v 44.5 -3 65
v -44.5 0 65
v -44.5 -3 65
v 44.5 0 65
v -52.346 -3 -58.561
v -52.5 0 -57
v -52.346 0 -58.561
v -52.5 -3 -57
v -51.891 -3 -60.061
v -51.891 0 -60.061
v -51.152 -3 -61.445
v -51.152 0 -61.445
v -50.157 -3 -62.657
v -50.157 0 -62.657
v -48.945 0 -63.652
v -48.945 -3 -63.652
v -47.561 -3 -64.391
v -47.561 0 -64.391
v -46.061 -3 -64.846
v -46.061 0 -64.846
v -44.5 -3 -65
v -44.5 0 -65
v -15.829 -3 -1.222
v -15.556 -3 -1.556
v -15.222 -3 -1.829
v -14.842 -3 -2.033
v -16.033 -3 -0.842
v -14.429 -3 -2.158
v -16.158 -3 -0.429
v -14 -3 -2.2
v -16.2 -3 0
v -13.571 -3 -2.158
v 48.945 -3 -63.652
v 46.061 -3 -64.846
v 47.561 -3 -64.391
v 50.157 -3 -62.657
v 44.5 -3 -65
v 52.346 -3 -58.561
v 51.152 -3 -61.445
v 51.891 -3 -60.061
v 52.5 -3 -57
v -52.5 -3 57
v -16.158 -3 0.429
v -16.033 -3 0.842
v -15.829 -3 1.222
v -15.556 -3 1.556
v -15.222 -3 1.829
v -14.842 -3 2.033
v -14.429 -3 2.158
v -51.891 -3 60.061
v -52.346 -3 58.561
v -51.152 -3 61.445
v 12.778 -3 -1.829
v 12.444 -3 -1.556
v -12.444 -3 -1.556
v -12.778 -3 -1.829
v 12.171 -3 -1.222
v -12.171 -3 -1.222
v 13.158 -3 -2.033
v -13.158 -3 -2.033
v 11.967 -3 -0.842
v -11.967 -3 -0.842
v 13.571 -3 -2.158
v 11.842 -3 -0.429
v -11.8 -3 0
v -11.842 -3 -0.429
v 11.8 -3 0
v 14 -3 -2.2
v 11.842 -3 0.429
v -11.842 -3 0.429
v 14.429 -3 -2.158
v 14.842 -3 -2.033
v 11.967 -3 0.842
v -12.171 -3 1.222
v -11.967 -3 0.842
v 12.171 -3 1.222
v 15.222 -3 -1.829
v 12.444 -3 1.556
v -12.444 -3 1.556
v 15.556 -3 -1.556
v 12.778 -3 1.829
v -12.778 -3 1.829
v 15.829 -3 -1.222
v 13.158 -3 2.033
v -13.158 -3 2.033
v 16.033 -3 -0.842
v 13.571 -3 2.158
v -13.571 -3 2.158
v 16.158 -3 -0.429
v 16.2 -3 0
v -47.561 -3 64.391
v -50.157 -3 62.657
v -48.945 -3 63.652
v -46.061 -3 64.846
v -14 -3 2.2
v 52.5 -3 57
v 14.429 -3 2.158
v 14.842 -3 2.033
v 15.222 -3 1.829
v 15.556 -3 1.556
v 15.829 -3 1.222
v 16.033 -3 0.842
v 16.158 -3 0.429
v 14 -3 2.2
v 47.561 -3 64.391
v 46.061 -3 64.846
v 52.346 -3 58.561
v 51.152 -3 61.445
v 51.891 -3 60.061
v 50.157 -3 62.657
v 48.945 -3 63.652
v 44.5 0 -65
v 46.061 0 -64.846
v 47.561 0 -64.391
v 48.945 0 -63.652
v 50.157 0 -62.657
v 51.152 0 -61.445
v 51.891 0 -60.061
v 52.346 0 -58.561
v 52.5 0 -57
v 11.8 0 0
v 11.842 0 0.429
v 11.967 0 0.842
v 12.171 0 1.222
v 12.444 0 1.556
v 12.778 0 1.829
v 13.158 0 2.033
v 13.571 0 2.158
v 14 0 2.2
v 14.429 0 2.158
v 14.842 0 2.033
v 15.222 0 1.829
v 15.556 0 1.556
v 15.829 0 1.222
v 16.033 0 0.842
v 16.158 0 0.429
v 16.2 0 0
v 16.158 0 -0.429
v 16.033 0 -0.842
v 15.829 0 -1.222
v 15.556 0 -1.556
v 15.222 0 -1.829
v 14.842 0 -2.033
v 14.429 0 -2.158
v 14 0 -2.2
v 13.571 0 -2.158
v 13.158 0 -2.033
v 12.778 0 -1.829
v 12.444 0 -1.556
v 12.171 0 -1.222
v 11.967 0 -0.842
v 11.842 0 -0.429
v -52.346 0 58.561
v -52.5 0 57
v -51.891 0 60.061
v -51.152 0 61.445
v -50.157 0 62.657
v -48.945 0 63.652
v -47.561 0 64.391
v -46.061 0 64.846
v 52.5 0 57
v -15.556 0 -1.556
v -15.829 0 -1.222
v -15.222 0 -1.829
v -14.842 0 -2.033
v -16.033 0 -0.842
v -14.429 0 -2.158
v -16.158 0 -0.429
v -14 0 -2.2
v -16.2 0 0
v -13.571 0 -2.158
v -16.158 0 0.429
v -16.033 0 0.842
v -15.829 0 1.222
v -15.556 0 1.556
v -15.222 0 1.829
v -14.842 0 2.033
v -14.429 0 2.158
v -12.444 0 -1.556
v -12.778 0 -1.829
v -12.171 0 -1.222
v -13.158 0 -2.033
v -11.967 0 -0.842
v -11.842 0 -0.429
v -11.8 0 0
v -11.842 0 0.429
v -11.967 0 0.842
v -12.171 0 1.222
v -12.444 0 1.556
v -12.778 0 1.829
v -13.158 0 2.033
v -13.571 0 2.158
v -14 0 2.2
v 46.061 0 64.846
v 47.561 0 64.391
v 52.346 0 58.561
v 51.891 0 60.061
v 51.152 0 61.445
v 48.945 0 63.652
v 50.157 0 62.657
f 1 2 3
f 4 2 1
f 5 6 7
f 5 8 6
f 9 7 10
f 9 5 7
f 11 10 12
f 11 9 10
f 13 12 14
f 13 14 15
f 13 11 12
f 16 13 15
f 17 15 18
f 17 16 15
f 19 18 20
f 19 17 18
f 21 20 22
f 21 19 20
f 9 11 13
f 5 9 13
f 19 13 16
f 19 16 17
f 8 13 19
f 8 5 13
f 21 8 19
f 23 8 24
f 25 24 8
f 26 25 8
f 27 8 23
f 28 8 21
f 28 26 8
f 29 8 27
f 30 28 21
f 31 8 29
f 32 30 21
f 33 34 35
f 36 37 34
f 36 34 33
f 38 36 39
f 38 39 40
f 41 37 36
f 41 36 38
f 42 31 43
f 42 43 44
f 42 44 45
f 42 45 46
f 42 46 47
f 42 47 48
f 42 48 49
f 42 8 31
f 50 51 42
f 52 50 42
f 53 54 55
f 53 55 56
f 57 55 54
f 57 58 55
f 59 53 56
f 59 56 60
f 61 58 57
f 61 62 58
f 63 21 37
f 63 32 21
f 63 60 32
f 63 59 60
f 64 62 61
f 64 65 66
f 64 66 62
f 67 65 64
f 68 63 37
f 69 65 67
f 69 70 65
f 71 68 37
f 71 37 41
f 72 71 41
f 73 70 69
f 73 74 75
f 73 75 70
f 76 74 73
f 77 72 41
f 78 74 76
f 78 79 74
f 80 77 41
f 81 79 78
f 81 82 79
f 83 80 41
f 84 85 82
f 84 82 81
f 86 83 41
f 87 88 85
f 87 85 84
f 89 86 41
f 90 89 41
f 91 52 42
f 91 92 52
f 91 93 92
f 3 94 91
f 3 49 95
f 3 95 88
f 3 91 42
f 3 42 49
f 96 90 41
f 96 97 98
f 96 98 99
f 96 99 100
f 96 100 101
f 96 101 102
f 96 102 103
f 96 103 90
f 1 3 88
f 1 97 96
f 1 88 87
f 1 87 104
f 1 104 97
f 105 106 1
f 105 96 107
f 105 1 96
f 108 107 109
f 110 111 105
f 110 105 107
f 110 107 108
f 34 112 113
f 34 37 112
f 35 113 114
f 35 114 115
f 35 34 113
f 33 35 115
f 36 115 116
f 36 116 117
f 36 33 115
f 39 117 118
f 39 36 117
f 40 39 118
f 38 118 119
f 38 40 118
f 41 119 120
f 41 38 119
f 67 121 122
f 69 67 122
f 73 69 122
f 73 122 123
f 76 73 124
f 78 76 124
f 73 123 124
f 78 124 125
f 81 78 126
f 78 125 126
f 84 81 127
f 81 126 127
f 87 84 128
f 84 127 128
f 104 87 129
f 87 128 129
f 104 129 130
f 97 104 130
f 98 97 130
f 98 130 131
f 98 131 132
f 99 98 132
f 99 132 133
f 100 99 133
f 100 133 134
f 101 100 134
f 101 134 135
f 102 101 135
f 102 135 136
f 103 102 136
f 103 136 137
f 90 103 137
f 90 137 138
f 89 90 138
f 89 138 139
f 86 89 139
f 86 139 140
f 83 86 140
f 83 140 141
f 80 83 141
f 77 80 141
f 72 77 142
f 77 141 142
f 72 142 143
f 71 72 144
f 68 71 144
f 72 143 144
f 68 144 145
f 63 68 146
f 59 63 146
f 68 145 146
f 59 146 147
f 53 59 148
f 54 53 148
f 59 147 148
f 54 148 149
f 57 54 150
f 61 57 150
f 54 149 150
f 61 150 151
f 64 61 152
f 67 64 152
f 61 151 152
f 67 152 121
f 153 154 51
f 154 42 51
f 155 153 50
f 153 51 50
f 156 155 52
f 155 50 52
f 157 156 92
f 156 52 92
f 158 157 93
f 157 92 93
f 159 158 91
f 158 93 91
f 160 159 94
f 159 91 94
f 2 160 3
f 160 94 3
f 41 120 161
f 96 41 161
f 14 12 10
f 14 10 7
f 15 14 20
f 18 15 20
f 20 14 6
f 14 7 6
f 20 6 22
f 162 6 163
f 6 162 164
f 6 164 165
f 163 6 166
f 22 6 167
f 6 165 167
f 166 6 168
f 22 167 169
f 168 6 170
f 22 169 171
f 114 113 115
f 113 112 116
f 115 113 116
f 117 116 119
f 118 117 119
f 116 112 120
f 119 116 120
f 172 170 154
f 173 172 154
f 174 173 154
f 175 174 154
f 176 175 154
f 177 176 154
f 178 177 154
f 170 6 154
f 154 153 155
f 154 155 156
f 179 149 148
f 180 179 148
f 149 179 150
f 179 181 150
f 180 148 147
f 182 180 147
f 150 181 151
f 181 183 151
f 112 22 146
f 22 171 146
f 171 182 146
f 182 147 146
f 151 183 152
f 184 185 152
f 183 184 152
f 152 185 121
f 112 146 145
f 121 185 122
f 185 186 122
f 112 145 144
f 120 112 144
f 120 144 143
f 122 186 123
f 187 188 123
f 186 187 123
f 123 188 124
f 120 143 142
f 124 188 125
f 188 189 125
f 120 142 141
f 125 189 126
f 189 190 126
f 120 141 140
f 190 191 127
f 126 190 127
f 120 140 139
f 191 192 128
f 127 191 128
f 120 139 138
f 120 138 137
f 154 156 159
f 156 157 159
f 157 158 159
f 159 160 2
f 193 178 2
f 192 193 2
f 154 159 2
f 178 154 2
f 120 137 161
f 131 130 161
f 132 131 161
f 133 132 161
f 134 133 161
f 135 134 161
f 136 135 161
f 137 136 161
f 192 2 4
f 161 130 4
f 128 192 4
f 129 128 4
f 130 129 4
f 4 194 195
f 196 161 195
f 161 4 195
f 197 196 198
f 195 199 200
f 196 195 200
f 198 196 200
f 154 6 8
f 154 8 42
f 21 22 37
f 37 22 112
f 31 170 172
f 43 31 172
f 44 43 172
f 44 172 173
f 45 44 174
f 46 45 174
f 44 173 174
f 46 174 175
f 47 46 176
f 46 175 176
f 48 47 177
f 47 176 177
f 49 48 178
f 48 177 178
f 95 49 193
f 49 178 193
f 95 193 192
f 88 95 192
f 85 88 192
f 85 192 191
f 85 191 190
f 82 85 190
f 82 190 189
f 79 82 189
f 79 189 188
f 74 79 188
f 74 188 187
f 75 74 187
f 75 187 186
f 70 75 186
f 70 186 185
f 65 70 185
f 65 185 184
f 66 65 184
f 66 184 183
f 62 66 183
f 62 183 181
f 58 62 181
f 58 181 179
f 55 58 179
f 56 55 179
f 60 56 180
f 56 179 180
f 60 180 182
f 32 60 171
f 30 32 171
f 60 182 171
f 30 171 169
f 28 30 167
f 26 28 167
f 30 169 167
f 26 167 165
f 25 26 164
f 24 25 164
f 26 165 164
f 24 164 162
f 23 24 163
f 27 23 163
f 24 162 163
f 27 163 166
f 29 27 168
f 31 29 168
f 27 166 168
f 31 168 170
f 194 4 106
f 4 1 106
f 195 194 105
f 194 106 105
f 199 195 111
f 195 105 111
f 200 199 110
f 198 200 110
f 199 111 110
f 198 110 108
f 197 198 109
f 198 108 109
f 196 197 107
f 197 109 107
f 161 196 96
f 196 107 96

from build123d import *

# Parameters (mm, degrees)
F0_W     = 105
F0_H     = 130
F1_DEPTH = 3
F3_D     = 4.4
F4_R     = 8


with BuildPart() as f1:
    # F0 (on Front) → F1 (new body)
    with BuildSketch(Plane.XZ):
        Rectangle(F0_W, F0_H)
    extrude(amount=F1_DEPTH)

    # F3 (through all)
    with Locations(Plane.XZ.offset(3)):
        with Locations((-14, 0), (14, 0)):
            Hole(F3_D / 2)

    # F4
    f4_edges = [f1.edges().sort_by_distance(p)[0] for p in [
        (52.5, -1.5, 65),
        (-52.5, -1.5, 65),
        (-52.5, -1.5, -65),
        (52.5, -1.5, -65),
    ]]
    fillet(f4_edges, radius=F4_R)


solid = f1.part
